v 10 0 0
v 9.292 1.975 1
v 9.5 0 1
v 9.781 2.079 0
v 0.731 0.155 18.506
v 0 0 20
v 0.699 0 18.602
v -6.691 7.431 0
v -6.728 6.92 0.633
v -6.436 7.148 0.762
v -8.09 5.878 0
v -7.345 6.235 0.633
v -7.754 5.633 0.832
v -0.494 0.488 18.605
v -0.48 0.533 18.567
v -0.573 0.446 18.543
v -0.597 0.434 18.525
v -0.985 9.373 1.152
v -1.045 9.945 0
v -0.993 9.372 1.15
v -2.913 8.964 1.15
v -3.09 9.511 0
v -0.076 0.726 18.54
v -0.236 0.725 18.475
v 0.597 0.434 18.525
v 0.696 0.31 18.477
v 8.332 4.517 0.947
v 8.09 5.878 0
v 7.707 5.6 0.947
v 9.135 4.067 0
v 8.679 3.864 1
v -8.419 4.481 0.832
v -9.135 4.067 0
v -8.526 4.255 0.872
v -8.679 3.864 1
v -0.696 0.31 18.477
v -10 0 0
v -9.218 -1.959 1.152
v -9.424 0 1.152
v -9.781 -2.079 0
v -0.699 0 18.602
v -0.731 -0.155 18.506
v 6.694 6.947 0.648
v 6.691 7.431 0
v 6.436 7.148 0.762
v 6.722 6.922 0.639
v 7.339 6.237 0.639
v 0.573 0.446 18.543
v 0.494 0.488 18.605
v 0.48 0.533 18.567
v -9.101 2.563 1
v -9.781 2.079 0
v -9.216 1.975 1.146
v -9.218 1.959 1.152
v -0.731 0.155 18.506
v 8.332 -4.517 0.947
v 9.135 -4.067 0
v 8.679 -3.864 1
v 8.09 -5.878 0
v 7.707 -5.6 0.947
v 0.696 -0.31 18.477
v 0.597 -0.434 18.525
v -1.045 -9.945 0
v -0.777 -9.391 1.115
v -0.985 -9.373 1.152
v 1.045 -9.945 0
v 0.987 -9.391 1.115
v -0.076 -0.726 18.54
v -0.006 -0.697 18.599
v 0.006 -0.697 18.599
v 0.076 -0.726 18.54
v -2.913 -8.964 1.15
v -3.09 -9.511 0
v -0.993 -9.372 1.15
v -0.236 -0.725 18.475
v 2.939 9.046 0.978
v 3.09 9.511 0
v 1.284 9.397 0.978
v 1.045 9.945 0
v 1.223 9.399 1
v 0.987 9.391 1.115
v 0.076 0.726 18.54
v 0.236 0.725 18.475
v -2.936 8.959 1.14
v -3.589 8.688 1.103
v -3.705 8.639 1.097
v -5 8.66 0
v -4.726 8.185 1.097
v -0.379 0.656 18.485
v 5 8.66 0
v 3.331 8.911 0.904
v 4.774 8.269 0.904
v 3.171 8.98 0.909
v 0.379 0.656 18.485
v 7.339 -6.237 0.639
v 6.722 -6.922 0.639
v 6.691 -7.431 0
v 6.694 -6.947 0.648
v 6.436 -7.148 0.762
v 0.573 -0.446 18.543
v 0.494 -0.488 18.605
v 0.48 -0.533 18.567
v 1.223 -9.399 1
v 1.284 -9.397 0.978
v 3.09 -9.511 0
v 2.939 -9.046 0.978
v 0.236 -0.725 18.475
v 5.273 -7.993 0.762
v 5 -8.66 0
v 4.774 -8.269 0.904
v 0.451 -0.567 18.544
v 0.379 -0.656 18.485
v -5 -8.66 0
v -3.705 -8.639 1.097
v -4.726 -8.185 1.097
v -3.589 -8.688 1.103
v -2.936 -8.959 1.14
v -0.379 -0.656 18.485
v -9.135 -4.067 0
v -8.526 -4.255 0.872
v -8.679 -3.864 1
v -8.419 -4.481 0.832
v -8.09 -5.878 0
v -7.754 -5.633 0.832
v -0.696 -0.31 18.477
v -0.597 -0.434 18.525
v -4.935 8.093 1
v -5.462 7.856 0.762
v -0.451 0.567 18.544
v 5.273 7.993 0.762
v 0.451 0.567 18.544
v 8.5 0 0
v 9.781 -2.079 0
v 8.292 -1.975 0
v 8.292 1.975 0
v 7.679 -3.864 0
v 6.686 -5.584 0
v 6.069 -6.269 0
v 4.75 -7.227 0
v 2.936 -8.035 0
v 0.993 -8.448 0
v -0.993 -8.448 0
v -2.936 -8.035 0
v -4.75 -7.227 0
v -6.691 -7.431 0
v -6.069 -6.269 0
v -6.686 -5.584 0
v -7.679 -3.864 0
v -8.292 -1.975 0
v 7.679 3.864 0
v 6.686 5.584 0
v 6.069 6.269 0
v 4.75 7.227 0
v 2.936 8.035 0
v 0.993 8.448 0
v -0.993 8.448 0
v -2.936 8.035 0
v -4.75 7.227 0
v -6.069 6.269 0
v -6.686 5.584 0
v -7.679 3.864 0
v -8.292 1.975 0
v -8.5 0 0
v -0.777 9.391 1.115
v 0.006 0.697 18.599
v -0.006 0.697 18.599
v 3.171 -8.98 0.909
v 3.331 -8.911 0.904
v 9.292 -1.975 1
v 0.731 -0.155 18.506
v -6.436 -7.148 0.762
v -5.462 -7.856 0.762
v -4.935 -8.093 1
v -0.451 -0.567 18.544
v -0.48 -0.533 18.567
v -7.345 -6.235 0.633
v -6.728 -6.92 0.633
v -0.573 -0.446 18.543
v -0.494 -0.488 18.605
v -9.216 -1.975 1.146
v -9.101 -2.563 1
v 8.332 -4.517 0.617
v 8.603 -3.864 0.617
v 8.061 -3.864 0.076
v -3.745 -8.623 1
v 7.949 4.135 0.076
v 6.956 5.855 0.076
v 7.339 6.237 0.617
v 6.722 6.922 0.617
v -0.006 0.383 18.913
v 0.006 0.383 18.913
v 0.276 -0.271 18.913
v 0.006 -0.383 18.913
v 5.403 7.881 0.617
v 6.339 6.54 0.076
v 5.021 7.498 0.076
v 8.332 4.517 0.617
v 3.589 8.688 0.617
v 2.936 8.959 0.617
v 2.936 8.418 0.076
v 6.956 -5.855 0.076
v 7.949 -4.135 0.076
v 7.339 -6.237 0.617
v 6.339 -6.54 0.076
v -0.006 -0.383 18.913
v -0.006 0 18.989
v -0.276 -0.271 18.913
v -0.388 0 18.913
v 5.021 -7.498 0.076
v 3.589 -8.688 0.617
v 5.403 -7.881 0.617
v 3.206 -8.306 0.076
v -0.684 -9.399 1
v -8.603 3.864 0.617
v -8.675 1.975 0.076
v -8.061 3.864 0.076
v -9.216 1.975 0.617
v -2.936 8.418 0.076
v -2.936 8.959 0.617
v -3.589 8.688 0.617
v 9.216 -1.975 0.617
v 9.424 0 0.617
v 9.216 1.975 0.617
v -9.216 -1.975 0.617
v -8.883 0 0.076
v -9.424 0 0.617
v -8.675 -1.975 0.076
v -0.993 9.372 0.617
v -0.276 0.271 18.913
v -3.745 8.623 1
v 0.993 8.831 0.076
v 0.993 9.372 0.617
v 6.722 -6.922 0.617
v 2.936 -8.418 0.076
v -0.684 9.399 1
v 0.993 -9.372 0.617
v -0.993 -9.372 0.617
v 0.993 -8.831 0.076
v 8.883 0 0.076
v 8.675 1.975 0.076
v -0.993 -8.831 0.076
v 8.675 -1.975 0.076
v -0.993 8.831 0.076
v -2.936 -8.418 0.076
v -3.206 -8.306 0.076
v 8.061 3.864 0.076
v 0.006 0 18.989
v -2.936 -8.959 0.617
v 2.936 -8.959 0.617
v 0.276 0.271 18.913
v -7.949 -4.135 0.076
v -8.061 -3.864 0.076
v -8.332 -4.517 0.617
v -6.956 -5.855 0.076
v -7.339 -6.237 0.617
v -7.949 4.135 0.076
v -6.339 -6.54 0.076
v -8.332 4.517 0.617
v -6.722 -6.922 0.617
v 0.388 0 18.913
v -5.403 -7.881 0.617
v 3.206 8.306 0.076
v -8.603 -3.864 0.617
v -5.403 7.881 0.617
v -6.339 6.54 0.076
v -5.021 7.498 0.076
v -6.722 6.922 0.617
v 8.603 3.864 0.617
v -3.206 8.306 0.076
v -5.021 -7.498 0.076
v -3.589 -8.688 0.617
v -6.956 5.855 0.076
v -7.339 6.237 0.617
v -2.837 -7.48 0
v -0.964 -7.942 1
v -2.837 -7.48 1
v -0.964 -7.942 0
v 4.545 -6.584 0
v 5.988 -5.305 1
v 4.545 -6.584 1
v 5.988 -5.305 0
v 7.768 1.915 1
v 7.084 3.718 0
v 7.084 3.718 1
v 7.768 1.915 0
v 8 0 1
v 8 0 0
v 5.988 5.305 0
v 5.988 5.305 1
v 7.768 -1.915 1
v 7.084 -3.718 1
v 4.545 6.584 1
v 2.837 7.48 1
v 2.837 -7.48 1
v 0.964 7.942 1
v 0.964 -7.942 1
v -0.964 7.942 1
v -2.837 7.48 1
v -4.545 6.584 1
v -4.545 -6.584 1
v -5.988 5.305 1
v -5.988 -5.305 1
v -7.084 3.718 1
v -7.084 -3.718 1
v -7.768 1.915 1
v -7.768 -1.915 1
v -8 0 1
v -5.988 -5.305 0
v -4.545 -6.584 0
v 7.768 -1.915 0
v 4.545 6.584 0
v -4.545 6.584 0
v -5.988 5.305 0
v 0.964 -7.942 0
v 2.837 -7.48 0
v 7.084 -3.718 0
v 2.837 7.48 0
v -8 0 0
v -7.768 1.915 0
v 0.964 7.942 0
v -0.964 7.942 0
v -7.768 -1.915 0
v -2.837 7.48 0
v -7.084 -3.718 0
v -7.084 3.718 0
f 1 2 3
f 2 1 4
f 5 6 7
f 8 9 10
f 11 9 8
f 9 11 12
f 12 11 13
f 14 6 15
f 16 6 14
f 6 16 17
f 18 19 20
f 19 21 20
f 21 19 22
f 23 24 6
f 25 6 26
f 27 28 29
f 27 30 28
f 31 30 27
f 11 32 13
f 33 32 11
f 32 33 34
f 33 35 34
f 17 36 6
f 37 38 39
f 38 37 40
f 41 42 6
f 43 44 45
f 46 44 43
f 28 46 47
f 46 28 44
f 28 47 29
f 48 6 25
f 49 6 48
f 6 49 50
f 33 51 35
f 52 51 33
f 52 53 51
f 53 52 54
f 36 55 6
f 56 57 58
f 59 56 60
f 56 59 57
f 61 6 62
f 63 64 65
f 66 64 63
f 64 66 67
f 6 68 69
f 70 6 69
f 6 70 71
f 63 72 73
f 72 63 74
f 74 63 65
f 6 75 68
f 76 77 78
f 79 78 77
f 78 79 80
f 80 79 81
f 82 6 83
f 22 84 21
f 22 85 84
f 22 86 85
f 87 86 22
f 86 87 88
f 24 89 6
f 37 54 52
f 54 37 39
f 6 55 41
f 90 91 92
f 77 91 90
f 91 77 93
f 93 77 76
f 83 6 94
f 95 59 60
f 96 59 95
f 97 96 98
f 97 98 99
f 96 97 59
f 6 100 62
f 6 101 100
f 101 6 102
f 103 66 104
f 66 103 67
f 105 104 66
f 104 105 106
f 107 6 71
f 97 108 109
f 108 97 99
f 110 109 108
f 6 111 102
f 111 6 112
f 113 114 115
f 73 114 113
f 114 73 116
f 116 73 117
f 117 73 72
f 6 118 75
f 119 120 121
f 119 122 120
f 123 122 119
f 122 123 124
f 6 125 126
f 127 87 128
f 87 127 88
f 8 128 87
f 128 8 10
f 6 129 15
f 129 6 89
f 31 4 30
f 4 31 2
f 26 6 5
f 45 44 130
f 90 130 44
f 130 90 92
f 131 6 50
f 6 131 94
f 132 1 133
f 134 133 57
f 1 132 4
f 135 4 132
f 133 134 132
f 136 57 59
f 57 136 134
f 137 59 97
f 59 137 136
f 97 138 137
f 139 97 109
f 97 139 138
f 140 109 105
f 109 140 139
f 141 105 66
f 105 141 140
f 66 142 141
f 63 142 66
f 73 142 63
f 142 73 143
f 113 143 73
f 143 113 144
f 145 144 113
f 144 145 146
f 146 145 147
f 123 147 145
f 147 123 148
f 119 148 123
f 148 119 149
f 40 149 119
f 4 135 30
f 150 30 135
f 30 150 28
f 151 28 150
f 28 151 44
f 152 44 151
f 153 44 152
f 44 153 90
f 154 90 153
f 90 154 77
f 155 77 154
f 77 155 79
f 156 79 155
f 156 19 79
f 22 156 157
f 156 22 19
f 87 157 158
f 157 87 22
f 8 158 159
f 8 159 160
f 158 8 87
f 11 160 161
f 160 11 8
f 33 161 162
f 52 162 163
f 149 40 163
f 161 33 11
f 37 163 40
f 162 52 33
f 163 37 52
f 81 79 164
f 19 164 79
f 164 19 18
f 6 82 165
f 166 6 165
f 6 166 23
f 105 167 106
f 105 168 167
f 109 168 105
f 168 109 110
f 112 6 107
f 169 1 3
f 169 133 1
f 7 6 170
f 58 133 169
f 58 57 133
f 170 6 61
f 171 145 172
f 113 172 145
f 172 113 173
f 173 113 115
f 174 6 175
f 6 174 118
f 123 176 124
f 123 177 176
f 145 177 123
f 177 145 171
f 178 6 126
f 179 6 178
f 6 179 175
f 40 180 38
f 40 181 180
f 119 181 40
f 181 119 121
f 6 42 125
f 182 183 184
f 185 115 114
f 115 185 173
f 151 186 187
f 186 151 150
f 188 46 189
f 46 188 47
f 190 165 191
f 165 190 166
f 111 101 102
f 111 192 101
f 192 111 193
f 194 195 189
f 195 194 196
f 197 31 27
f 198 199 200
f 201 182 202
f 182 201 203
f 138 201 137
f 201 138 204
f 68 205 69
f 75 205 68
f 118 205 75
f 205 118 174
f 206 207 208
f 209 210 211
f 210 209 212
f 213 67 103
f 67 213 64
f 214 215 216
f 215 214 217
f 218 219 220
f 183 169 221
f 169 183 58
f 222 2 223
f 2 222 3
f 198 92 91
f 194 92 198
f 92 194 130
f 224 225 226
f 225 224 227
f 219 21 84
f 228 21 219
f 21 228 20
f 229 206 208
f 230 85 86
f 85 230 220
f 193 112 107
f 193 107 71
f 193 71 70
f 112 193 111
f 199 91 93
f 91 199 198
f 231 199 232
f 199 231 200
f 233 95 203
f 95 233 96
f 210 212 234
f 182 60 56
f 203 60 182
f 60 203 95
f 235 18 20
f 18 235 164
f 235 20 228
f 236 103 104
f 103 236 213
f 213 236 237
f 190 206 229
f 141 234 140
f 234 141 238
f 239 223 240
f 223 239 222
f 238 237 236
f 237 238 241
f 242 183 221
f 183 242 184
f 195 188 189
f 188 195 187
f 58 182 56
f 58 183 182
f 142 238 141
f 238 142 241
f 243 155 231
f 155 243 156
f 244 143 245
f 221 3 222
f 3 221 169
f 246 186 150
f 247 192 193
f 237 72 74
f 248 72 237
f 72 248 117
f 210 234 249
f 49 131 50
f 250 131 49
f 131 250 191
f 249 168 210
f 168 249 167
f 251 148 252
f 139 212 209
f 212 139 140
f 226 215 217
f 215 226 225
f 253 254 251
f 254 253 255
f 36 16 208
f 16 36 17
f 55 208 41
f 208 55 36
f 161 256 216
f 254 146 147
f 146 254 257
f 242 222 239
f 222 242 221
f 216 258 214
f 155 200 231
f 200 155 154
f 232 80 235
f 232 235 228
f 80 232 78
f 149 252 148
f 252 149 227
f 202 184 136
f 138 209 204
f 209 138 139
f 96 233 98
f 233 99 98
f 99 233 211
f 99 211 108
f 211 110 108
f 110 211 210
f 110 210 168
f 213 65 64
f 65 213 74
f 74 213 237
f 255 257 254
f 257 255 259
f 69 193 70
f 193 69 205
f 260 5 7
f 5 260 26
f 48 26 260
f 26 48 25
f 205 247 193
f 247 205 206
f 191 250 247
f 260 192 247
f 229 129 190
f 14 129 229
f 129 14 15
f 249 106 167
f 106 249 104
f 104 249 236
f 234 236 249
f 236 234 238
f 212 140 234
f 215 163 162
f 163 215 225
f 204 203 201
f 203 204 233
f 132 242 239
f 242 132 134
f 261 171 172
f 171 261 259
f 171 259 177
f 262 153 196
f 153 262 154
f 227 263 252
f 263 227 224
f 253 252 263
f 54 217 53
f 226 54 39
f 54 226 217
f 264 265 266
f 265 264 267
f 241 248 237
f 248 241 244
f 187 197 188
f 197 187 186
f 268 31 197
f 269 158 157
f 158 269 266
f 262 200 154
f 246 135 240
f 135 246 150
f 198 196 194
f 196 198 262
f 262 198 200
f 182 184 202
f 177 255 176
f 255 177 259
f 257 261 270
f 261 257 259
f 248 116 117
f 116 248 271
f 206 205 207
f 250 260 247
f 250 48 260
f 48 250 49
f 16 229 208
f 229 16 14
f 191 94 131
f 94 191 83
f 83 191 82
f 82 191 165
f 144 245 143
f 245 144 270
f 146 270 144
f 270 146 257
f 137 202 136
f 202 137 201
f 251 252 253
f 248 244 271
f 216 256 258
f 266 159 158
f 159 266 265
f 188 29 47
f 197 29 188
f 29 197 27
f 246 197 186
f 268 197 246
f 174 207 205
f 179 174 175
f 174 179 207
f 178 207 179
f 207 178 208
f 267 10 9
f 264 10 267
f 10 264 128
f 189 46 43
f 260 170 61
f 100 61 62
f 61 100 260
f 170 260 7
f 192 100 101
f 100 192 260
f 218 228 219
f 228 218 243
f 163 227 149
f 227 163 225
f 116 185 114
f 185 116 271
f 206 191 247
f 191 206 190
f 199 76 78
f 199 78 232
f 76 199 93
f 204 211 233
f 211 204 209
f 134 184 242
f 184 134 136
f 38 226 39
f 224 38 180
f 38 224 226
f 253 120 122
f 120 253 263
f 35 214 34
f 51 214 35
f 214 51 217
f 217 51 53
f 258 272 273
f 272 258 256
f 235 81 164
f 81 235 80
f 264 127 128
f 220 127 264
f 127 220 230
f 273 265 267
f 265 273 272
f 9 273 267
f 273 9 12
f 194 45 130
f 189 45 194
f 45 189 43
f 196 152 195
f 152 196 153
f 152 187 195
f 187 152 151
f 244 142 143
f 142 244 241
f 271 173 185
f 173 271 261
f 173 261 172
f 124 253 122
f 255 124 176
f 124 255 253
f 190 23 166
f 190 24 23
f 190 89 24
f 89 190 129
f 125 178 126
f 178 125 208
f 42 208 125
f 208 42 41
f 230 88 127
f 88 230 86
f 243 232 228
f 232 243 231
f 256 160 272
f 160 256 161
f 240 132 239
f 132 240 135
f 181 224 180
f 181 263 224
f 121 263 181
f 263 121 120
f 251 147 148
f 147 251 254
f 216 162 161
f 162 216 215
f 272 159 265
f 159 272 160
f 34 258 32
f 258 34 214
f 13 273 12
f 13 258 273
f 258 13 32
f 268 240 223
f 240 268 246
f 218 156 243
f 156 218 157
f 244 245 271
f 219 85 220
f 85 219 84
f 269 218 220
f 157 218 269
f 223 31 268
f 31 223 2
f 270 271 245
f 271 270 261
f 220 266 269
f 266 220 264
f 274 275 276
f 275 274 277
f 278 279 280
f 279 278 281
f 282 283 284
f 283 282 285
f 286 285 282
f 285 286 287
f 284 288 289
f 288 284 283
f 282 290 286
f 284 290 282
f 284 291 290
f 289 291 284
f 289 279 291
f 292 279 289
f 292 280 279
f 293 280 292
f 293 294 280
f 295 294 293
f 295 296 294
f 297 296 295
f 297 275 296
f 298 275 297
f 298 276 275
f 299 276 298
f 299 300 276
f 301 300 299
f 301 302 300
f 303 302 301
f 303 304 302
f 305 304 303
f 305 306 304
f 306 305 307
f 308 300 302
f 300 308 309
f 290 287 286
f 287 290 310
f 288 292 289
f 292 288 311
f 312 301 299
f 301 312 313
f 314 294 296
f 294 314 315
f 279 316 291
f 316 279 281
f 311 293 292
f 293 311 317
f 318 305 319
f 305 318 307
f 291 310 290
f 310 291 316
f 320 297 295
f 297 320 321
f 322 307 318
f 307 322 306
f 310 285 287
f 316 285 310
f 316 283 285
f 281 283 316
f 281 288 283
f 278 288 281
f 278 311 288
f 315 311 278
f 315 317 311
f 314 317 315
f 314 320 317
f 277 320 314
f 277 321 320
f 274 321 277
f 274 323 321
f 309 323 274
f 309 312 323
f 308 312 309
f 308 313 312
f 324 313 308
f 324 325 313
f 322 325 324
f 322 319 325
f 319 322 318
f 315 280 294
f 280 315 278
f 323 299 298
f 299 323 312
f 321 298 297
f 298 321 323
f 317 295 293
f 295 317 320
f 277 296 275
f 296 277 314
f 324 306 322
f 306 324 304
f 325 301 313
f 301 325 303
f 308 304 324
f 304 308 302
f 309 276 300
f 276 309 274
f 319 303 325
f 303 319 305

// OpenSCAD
// Identify thinner sections.
test_module="test offset_3d";
test_module="test drc_thinner";

module offset_3d(delta=0.1) {
    intersection_for(i=[0:7]) {
        if(i==0) {
            translate([0,0,-delta]) children();
        } else if(i==1) {
            translate([0,0,delta]) children();
        } else {
            translate(delta*[cos(90*i),sin(90*i),0]) children();
        }
    }
}

if(test_module=="test offset_3d") {
    % cylinder(r1=10,r2=0,h=10);
    offset_3d(delta=0.5) cylinder(r1=10,r2=0,h=10);
}

module drc_thinner(delta=0.1) {
    difference() {
        children();
        intersection() {
            children();
            minkowski() {
                offset_3d(delta=delta) children();
                hull() {
                    cylinder(r1=delta,r2=0,h=delta);
                    rotate([180,0,0]) cylinder(r1=delta,r2=0,h=delta);
                    sphere(r=delta,$fn=8);
                }
            }
        }
    }
}

if(test_module=="test drc_thinner") {
    %cylinder(r1=10,r2=0,h=20);
    #cylinder(r=8.0,h=1.0);
    drc_thinner(delta=1.0) cylinder(r1=10,r2=0,h=20);
}
